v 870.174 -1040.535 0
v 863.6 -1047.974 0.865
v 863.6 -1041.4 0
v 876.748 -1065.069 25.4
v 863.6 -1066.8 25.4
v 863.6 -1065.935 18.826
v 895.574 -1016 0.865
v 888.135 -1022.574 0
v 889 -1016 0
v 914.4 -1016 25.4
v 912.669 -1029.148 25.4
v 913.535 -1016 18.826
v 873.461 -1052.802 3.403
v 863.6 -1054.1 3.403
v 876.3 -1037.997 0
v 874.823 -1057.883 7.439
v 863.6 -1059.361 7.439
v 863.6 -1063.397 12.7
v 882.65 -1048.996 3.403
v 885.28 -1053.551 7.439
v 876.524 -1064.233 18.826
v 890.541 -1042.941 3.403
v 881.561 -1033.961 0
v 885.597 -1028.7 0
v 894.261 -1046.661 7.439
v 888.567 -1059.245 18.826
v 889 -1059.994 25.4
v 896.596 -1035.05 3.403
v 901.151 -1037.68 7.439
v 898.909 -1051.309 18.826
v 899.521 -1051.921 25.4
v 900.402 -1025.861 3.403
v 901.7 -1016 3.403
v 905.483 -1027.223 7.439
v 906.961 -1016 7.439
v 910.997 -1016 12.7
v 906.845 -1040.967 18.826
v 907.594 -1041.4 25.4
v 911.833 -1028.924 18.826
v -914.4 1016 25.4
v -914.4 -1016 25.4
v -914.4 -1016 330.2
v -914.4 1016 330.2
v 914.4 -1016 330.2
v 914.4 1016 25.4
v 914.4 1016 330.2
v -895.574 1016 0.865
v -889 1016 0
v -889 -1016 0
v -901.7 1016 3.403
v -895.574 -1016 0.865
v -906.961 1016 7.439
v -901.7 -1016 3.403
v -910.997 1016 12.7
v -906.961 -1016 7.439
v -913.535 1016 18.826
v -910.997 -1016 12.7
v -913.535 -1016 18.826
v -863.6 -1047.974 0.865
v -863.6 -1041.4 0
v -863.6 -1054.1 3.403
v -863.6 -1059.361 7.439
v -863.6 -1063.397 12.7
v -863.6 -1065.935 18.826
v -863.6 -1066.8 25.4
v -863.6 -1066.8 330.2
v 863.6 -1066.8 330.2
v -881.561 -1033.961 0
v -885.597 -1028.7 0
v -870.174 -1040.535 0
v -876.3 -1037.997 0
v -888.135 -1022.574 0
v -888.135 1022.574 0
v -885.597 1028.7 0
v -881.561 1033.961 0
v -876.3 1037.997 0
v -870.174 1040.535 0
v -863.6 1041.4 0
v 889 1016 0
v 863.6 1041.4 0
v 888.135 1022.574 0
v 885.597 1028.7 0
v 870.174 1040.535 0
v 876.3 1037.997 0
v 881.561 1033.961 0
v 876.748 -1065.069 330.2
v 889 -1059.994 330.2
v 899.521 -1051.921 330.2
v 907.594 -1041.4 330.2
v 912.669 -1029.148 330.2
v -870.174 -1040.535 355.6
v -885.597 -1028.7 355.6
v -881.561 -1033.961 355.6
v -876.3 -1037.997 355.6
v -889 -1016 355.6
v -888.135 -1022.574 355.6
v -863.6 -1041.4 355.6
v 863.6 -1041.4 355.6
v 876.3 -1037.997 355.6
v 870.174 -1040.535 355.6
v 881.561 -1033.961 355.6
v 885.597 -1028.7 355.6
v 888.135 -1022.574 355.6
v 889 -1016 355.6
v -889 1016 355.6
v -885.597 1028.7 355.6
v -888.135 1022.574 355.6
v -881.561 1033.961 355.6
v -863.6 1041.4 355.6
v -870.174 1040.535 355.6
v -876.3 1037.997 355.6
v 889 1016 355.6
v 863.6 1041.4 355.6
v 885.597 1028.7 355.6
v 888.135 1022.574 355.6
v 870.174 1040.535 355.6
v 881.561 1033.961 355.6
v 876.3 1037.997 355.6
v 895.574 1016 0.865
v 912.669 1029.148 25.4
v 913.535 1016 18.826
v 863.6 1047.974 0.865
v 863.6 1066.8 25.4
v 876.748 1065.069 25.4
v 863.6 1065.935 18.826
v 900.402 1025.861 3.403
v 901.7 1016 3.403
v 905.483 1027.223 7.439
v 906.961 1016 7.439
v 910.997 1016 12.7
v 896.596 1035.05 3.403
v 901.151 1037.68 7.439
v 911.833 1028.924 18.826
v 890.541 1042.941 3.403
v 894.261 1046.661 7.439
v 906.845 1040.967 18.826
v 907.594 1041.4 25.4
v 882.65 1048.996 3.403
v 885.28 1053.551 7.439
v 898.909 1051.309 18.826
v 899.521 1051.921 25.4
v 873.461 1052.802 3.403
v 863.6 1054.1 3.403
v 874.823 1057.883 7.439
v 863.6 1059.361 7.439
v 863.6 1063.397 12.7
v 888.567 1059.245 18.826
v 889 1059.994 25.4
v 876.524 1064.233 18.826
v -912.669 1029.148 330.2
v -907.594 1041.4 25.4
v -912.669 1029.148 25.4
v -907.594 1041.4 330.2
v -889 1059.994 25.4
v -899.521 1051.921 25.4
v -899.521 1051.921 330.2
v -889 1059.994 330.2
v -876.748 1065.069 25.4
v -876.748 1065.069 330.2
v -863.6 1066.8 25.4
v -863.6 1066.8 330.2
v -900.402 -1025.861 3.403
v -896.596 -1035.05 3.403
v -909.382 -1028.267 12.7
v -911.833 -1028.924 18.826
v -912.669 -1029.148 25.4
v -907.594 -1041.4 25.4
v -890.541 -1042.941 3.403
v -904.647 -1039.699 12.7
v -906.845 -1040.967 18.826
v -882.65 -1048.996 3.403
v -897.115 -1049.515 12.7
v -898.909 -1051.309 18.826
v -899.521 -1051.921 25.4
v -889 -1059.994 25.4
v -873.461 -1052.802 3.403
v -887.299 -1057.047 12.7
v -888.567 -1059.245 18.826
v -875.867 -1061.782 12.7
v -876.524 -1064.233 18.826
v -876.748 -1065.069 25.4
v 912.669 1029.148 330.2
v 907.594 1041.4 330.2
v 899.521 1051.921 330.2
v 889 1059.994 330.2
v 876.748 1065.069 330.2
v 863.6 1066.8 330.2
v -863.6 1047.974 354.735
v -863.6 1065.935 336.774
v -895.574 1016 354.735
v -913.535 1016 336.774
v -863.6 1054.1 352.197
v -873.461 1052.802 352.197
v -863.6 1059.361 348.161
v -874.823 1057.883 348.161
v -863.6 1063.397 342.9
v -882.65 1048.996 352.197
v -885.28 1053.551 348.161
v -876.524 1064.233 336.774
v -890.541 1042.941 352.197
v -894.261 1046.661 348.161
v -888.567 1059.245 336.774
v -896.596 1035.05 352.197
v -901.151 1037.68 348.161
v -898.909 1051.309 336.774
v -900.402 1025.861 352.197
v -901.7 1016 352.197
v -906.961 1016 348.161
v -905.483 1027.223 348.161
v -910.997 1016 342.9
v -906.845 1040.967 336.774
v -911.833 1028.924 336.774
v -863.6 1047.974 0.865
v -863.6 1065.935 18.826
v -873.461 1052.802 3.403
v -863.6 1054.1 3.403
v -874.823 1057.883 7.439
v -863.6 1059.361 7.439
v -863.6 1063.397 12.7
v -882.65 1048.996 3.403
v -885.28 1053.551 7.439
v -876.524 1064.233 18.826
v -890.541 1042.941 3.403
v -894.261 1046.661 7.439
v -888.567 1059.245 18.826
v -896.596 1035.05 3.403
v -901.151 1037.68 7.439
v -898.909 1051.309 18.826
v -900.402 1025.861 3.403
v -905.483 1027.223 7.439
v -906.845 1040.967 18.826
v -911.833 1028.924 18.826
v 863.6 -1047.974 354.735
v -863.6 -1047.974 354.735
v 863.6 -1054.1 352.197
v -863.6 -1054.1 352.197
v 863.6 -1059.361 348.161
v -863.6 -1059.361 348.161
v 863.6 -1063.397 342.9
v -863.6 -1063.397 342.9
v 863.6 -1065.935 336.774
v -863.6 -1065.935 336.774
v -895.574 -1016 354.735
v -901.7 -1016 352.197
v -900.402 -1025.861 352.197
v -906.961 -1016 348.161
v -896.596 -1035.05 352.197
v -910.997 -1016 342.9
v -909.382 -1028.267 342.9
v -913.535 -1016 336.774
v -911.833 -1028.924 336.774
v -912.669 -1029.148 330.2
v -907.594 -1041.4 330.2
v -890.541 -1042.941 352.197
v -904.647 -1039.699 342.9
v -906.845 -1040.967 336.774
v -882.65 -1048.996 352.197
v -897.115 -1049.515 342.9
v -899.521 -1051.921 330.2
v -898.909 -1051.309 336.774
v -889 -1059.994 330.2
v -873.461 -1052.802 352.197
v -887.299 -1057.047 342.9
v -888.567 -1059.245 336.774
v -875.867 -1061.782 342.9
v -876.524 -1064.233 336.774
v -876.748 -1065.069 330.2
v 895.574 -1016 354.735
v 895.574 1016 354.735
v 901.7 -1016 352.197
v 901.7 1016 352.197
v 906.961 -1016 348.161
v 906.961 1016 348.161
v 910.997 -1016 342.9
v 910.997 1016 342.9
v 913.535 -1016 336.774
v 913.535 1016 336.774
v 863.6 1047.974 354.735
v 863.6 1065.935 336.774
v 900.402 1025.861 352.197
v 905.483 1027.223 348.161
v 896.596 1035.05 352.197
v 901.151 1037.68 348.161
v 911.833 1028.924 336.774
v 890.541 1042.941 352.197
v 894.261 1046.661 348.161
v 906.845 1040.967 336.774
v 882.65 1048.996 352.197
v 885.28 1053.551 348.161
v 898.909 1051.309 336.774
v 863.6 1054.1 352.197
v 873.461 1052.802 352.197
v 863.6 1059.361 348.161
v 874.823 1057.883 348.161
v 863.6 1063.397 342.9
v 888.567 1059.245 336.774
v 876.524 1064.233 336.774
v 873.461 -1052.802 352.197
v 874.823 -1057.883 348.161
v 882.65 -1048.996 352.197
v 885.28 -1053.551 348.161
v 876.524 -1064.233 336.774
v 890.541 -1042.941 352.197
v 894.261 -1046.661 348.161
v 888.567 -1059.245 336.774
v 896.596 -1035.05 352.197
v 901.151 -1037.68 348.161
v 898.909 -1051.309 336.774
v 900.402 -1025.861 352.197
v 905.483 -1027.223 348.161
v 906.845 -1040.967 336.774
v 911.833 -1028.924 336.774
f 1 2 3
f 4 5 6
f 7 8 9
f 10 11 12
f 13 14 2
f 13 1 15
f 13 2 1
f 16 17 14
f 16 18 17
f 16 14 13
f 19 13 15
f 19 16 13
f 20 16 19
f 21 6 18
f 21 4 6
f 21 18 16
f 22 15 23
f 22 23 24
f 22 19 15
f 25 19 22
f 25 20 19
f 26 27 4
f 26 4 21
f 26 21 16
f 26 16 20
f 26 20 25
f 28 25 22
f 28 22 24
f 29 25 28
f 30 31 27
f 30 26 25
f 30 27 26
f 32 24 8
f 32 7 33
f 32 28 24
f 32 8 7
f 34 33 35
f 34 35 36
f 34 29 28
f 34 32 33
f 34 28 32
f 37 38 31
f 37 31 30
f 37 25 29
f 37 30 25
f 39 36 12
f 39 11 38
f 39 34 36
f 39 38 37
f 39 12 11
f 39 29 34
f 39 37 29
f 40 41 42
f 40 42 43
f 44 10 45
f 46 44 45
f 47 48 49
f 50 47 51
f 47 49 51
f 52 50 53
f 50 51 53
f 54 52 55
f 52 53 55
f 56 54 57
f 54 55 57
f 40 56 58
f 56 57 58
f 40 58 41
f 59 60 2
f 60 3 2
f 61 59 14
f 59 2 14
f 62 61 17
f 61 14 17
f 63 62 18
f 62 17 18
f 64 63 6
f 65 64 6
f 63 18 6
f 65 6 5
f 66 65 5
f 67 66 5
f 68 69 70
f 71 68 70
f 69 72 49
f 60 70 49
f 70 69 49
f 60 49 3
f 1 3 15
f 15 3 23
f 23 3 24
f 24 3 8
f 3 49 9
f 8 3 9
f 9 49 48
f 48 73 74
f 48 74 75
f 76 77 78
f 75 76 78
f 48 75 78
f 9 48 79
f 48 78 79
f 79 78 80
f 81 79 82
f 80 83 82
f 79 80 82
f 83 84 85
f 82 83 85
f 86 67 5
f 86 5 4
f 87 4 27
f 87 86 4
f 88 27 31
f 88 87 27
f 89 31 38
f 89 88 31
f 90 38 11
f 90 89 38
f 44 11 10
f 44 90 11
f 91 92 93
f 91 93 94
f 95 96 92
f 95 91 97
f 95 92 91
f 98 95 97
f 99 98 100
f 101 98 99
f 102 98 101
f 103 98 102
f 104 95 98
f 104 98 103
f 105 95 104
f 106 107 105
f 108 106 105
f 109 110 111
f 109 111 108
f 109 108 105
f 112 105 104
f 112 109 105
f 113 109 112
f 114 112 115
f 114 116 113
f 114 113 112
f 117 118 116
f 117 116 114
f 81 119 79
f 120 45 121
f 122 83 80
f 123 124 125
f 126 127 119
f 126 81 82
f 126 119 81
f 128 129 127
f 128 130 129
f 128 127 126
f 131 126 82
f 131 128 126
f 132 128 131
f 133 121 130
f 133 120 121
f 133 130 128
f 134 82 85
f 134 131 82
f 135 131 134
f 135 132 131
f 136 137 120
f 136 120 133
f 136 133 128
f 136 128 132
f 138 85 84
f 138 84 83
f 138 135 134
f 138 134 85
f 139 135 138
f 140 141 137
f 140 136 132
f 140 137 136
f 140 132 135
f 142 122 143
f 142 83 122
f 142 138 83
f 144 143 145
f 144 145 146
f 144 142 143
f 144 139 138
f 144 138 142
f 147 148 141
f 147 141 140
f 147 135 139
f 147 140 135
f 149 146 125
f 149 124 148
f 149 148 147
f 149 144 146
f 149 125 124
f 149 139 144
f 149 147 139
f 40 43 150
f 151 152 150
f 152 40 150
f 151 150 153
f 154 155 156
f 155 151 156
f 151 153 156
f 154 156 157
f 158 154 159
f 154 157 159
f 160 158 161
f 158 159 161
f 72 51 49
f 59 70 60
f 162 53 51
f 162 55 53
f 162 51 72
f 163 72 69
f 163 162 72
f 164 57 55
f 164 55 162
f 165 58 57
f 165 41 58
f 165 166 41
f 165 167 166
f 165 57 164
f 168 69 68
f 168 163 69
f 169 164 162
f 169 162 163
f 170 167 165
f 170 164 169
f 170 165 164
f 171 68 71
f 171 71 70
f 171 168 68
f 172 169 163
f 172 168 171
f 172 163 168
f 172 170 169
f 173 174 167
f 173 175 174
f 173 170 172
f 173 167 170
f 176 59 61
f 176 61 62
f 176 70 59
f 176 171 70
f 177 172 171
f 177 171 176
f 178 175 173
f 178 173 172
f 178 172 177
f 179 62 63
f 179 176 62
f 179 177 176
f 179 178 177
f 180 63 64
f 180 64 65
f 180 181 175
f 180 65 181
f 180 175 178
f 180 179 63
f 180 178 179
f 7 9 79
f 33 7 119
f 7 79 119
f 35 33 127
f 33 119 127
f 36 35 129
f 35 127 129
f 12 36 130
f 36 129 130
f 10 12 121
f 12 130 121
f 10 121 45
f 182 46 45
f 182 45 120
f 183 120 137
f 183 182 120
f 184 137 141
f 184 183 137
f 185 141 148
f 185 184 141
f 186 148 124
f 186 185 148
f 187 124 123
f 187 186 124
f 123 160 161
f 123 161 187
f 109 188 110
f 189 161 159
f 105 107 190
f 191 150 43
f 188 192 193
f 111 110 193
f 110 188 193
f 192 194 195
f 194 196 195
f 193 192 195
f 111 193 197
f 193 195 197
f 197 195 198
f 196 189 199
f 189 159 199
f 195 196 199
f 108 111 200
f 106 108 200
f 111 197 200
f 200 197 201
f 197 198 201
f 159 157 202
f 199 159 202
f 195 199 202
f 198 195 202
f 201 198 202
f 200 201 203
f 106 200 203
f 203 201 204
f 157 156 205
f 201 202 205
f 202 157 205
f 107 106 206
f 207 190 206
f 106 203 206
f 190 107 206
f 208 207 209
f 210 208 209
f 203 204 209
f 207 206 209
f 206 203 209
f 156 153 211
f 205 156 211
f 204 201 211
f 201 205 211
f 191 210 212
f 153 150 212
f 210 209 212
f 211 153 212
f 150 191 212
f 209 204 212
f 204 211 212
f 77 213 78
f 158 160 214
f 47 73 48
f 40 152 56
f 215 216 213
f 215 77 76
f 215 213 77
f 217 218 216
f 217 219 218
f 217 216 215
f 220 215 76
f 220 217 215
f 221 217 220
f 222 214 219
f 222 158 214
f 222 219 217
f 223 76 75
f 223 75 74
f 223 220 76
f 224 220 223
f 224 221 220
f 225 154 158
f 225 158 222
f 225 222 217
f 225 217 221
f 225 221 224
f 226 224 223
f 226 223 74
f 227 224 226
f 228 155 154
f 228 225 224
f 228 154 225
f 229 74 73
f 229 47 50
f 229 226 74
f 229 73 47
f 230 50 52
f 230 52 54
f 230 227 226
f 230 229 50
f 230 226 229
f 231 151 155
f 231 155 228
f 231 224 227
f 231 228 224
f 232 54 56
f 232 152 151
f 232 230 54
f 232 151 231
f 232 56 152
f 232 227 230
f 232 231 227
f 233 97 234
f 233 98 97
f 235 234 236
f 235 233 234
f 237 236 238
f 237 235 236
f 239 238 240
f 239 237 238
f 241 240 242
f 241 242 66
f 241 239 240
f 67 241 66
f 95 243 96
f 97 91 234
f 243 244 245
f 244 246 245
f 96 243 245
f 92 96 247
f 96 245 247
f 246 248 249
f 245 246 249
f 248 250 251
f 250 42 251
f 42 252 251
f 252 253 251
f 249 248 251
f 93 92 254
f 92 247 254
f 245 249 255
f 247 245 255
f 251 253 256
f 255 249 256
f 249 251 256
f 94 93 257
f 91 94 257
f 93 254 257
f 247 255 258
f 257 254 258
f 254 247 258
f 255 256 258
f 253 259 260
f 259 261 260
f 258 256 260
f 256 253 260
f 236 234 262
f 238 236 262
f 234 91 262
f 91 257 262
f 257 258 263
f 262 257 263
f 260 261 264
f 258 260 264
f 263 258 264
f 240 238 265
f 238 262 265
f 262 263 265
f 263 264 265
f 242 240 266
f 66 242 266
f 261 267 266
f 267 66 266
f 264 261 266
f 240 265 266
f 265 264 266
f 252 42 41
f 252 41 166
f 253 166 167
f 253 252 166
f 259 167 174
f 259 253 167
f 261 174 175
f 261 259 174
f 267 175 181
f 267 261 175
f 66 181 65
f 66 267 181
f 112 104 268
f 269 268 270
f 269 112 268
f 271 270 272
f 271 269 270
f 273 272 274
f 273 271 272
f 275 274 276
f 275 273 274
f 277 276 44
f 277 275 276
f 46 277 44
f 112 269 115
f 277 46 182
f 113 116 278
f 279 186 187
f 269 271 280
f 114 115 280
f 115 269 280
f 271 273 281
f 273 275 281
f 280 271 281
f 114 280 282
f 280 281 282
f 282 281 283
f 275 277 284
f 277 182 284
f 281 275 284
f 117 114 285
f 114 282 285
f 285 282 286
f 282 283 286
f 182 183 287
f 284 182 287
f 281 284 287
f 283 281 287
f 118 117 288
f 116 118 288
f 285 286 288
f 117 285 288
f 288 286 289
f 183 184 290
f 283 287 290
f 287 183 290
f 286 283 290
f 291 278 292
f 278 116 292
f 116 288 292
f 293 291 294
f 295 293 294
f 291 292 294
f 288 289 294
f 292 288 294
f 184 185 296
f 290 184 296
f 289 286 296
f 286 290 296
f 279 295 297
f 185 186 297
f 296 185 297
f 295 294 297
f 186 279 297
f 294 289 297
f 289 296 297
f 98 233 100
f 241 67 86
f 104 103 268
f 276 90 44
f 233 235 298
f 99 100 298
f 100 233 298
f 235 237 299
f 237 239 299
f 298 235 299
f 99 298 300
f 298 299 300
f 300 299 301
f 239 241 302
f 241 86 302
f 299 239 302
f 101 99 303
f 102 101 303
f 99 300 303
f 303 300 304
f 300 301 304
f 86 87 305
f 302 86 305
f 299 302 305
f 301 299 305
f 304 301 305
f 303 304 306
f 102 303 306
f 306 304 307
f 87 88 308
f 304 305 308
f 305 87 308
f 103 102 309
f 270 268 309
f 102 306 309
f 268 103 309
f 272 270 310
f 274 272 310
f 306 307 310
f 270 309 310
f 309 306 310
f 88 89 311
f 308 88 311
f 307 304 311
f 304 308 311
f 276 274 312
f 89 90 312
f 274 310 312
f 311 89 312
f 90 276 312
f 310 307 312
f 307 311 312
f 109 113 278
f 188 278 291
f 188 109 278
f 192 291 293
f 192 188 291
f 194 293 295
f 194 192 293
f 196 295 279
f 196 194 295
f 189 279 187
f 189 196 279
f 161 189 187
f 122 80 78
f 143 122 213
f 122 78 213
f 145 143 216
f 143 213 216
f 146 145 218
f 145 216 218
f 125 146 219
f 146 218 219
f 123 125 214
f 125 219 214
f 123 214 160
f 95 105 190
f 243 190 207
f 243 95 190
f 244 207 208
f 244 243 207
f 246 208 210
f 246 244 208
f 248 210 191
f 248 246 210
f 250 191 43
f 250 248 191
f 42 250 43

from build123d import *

# Parameters (mm, degrees)
F0_W     = 1828.8
F0_H     = 2133.6
F1_DEPTH = 355.6
F2_R     = 50.8
F3_R     = 25.4


with BuildPart() as f1:
    # F0 (on Top) → F1 (new body)
    with BuildSketch(Plane.XY):
        Rectangle(F0_W, F0_H)
    extrude(amount=F1_DEPTH)

    # F2
    f2_edges = [f1.edges().sort_by_distance(p)[0] for p in [
        (-914.4, 1066.8, 177.8),
        (-914.4, -1066.8, 177.8),
        (914.4, 1066.8, 177.8),
        (914.4, -1066.8, 177.8),
    ]]
    fillet(f2_edges, radius=F2_R)

    # F3
    f3_edges = [f1.edges().sort_by_distance(p)[0] for p in [
        (0, -1066.8, 355.6),
        (0, -1066.8, 0),
    ]]
    fillet(f3_edges, radius=F3_R)


solid = f1.part
